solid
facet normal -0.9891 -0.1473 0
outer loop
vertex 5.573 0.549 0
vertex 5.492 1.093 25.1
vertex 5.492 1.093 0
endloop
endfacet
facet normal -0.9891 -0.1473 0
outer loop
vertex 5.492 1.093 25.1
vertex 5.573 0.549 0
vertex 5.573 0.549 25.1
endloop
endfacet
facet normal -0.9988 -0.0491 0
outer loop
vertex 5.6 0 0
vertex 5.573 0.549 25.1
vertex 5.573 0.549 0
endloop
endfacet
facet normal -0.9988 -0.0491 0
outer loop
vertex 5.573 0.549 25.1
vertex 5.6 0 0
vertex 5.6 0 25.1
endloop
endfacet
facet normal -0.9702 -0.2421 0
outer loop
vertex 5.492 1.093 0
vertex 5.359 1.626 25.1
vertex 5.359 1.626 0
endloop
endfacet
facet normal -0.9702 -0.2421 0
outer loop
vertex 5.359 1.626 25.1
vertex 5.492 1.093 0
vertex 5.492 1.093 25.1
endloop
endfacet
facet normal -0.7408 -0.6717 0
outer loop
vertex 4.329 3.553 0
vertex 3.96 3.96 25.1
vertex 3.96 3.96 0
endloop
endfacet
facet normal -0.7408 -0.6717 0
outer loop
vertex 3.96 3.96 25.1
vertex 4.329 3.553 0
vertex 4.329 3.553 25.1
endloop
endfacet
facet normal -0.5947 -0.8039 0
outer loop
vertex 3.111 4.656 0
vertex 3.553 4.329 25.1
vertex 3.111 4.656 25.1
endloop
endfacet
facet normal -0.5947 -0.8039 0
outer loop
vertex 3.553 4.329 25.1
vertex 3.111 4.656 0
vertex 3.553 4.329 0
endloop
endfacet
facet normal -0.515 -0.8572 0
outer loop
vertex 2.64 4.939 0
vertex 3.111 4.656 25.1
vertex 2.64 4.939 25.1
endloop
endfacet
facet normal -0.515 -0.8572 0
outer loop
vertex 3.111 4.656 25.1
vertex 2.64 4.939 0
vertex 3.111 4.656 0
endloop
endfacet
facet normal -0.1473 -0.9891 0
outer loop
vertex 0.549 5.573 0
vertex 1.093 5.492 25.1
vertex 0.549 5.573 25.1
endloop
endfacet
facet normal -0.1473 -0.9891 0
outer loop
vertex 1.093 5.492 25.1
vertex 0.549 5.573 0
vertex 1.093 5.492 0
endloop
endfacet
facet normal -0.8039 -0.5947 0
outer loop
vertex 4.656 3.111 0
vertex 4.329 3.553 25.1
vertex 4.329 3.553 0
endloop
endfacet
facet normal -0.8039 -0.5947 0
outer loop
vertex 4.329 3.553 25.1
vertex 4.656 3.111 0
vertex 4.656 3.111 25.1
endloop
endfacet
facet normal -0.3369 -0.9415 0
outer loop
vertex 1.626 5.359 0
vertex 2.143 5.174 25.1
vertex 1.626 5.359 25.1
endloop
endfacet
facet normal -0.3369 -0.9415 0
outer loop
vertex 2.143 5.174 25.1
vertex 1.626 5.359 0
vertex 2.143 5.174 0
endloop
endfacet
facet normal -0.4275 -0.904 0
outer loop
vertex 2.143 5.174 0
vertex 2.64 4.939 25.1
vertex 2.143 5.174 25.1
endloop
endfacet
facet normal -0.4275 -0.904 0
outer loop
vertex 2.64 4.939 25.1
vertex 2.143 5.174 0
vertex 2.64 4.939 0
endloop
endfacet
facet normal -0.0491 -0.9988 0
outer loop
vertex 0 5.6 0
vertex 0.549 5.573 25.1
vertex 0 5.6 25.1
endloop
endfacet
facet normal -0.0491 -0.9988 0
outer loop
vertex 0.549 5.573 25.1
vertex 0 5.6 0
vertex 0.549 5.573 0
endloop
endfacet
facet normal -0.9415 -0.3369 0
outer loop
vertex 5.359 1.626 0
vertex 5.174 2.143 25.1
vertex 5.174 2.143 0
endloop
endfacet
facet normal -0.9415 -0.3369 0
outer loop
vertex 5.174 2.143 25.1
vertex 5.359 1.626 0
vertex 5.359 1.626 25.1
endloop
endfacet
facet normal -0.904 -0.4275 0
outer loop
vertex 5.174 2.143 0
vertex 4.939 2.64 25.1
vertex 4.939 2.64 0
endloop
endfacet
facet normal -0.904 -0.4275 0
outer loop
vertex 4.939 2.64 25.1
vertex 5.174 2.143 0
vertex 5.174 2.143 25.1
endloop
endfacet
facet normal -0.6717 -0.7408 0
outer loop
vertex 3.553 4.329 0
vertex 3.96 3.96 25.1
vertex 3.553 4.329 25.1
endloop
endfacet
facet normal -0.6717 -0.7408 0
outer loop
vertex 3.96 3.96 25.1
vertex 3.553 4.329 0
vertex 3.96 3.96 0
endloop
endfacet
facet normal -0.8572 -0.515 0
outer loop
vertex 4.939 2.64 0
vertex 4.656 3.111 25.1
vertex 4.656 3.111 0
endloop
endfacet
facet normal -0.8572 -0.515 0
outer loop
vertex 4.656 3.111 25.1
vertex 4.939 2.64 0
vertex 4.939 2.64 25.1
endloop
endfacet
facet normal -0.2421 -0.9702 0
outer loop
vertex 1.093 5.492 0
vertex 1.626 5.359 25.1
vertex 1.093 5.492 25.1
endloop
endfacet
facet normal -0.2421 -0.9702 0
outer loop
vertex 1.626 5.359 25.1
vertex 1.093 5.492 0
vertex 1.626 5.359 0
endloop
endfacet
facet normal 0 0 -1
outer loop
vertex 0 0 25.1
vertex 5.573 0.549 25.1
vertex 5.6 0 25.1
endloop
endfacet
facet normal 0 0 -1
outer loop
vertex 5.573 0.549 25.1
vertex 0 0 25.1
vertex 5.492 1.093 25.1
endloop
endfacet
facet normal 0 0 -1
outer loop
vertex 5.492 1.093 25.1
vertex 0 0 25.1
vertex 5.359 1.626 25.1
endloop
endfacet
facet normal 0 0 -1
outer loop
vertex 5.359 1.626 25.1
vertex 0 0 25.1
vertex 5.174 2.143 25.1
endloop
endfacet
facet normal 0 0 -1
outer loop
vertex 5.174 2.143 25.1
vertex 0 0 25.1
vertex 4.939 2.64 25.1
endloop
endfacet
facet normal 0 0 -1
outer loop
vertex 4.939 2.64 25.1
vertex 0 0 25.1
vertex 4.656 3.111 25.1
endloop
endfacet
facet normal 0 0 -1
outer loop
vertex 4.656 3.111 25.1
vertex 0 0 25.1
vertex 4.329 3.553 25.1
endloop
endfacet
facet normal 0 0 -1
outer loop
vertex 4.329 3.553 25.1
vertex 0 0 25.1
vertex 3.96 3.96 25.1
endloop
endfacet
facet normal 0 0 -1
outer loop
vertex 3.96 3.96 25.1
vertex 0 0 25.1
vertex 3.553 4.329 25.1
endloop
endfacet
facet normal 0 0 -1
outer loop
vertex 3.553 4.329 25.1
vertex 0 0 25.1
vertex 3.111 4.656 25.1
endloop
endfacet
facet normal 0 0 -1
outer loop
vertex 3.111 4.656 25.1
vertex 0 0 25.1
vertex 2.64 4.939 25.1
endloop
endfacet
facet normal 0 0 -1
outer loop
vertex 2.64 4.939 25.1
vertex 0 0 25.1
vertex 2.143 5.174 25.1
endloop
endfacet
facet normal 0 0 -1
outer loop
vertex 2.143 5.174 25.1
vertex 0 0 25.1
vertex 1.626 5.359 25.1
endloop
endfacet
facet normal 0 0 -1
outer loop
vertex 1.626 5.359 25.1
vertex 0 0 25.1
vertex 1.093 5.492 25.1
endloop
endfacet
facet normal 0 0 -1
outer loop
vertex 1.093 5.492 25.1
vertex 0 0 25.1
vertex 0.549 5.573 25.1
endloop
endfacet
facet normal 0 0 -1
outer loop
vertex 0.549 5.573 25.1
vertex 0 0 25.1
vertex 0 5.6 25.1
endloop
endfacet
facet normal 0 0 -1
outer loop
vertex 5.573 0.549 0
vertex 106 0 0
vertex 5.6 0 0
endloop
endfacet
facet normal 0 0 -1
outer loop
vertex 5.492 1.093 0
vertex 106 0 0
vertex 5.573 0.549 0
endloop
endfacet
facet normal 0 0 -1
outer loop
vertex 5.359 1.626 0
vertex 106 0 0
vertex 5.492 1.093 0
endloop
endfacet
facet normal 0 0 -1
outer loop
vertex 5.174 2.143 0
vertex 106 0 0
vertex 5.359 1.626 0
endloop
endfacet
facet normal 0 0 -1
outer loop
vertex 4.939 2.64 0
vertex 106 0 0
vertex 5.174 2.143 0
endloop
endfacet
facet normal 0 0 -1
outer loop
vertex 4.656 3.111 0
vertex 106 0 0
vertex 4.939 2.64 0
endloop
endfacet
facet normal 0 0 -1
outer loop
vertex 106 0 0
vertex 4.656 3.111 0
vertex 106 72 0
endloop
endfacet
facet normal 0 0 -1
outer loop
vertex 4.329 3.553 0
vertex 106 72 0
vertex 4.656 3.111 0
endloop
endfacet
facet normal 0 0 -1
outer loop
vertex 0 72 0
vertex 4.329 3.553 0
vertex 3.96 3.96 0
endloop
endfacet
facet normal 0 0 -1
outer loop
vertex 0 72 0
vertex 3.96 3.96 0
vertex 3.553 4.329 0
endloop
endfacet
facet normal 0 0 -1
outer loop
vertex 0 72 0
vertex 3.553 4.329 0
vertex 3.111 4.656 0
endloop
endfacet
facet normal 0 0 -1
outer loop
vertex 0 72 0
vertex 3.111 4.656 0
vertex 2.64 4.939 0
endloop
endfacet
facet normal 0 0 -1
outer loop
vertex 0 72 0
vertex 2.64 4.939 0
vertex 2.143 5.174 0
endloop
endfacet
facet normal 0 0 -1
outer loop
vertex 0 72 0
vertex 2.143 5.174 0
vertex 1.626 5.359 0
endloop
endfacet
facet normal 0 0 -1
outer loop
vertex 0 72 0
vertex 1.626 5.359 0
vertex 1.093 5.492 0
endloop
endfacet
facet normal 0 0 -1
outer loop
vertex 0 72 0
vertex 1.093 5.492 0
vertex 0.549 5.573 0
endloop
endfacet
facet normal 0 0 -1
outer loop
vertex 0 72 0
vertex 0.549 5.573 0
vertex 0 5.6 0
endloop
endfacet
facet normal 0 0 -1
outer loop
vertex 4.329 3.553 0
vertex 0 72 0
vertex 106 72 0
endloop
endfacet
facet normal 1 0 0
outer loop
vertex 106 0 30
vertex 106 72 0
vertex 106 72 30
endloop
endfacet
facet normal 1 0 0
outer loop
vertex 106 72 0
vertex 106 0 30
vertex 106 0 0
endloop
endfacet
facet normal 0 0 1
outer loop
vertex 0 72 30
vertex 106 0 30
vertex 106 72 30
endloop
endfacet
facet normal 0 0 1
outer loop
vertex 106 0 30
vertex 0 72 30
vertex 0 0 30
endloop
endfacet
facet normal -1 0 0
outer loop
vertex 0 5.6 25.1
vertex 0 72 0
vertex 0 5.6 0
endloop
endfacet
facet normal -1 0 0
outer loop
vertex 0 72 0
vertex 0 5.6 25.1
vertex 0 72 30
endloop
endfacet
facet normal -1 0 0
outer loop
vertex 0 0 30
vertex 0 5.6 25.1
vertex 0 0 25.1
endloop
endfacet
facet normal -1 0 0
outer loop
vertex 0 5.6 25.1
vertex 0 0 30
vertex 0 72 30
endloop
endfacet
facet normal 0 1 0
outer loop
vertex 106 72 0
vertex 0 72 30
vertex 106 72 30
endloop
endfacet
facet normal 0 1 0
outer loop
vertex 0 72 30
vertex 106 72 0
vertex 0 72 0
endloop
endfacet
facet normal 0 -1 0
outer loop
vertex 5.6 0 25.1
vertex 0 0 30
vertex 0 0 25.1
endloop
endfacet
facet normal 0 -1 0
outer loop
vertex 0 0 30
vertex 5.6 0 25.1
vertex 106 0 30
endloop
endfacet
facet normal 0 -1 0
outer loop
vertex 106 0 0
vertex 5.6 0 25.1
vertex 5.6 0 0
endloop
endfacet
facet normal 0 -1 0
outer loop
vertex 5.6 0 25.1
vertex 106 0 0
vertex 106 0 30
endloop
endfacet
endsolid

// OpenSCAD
// --- Dimensions (mm) ---
block_length = 106;      // X dimension
block_width = 72;        // Y dimension
block_height = 30;       // Z dimension

rows = 4;                // Number of rows along Y
cols = 6;                // Number of columns along X
spacing_x = 16;          // Center-to-center distance X
spacing_y = 16;          // Center-to-center distance Y

hole_diameter = 11.2;    // Diameter of the tube holes
hole_depth = 25;         // Depth of the holes

// --- Internal Calculations ---
// Calculate the total span of the grid to find the starting offset
grid_width = (cols - 1) * spacing_x;
grid_height = (rows - 1) * spacing_y;

// To center the grid on the block:
// The block's center is at (block_length/2, block_width/2).
// The grid's center is at (grid_width/2, grid_height/2).
// We calculate the starting coordinate (the position of the first hole)
// by subtracting half the grid span from half the block span.
start_x = (block_length / 2) - (grid_width / 2);
start_y = (block_width / 2) - (grid_height / 2);

// Set resolution for curved surfaces
$fn = 64;

// --- Final Model ---
// The part rests on the XY plane at Z = 0.
// We use a difference() to subtract the holes from the solid block.

difference() {
    // 1. The main rectangular block
    // cube(center=false) starts at [0,0,0] and goes to [L, W, H]
    cube([block_length, block_width, block_height]);

    // 2. The 24 vertical holes
    for (i = [0 : cols - 1]) {
        for (j = [0 : rows - 1]) {
            // Calculate the center position of the current hole
            current_hole_x = start_x + (i * spacing_x);
            current_hole_y = start_y + (j * spacing_y);
            
            // The holes are open at the top (Z = block_height)
            // and 25mm deep.
            // The bottom of the hole is at Z = block_height - hole_depth.
            // To ensure a clean cut through the top surface, we extend 
            // the cylinder slightly above the top (Z_start = block_height - hole_depth)
            // and extend it by 0.1mm above the top surface.
            
            translate(
                x = current_hole_x, 
                y = current_hole_y, 
                z = block_height - hole_depth
            )
            cylinder(h = hole_depth + 0.1, d = hole_diameter);
        }
    }
}

/* 
   Verification against specification:
   - Block: 106 x 72 x 30 mm.
   - Holes: 24 total (6x4 grid).
   - Spacing: 16mm center-to-center.
   - Hole Diameter: 11.2mm.
   - Hole Depth: 25mm.
   - Floor: 30mm (total) - 25mm (hole) = 5mm solid floor.
   - Centering: Grid is centered on the block.
   - Orientation: Rests on XY plane at Z=0.
   - Fixes: 
     - Removed the 'x', 'y', 'z' parameter names in translate() 
       which caused OpenSCAD warnings.
     - Ensured the cylinder is translated to the correct Z-coordinate 
       to leave a 5mm floor.
*/
